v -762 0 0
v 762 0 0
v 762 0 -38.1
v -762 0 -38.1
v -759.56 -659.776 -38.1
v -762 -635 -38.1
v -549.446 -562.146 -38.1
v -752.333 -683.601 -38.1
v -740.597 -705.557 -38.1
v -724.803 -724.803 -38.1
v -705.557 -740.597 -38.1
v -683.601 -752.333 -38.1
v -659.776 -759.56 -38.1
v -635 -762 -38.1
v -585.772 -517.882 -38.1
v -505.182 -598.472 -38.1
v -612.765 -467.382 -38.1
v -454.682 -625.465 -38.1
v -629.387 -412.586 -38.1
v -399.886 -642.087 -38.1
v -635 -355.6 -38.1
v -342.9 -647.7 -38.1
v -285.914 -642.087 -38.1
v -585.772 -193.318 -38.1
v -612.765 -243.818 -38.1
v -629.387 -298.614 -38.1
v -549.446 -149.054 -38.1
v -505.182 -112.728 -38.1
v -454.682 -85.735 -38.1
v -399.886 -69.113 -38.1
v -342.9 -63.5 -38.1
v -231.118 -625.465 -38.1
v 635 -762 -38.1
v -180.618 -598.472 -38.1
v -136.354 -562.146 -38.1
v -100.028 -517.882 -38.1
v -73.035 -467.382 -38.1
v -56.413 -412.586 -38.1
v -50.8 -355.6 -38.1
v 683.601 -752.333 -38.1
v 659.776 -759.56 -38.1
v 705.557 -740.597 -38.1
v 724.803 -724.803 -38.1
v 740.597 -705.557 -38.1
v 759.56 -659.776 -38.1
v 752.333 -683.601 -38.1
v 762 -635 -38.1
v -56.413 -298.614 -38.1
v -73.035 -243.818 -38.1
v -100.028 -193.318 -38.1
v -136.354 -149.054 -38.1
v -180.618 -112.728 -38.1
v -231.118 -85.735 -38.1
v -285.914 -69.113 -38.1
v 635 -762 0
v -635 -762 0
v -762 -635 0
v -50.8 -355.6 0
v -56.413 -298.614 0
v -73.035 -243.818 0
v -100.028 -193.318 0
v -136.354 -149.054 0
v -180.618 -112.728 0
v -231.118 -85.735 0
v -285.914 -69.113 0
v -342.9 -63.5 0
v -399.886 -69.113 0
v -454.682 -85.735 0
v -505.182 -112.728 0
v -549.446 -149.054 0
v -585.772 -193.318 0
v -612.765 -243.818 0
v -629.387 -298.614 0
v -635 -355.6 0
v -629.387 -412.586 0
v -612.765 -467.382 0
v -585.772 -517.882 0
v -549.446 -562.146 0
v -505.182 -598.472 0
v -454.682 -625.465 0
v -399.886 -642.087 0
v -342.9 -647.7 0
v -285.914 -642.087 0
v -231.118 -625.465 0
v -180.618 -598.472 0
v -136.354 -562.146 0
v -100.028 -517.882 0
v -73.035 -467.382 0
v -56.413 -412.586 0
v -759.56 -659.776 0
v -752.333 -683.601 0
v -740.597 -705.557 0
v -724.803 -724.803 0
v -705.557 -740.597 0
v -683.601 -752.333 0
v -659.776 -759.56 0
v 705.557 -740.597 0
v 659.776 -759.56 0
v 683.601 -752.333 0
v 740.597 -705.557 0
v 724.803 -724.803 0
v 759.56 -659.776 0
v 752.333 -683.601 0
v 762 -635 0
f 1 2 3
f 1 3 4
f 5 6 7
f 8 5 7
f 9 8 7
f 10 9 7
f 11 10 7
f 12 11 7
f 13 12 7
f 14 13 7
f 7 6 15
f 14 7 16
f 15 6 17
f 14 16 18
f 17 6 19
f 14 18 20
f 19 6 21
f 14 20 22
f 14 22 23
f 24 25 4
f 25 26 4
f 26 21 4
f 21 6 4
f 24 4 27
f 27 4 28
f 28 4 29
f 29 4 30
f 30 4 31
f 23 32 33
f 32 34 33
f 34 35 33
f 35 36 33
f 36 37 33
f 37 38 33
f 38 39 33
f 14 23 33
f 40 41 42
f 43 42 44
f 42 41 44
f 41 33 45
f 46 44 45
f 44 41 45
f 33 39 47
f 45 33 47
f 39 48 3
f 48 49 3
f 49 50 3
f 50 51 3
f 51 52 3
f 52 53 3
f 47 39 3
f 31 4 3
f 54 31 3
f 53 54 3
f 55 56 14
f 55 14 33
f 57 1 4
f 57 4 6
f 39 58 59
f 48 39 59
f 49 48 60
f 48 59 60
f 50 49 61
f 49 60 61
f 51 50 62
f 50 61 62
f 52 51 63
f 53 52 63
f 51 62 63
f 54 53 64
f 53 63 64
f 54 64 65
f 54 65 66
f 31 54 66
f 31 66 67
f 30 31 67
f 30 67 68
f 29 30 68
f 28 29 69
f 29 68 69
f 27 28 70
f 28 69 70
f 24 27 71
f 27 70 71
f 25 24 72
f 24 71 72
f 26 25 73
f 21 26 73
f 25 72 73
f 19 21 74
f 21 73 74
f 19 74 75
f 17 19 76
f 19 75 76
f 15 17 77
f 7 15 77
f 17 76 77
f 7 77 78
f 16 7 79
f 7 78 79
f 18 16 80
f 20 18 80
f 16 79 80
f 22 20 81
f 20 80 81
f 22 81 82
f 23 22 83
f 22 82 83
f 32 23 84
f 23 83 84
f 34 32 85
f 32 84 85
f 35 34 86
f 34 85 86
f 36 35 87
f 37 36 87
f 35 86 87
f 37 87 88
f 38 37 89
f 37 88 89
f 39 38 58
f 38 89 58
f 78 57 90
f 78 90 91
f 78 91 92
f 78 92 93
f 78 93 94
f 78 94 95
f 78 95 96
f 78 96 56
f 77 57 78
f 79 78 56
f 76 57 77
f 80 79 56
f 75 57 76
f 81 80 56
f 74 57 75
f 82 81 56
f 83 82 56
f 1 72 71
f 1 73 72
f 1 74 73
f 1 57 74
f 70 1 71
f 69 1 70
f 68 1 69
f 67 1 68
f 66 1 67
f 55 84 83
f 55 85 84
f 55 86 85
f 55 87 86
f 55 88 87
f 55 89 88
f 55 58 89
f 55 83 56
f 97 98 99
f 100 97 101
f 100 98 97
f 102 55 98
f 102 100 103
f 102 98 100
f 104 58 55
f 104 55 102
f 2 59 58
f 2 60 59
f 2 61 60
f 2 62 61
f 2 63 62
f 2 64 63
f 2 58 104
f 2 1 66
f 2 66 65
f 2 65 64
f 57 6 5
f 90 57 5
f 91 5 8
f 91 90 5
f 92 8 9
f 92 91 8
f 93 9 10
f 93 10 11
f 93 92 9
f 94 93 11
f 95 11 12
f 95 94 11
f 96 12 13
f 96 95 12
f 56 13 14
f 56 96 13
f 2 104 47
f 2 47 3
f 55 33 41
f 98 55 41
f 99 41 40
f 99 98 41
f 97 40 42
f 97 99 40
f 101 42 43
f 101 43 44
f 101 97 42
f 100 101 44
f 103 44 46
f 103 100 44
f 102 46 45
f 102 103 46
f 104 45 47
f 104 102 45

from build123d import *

# Parameters (mm, degrees)
F0_R     = 292.1
F1_DEPTH = 38.1


with BuildPart() as f1:
    # F0 (on Top) → F1 (new body)
    with BuildSketch(Plane.XY):
        with BuildLine():
            Line((762, 0), (-762, 0))
            Line((-762, 0), (-762, -635))
            ThreePointArc((-762, -635), (-724.802561, -724.802561), (-635, -762))
            Line((-635, -762), (635, -762))
            ThreePointArc((635, -762), (724.802561, -724.802561), (762, -635))
            Line((762, -635), (762, 0))
        make_face()
        with Locations((-342.9, -355.6)):
            Circle(F0_R, mode=Mode.SUBTRACT)
    extrude(amount=-F1_DEPTH)


solid = f1.part
